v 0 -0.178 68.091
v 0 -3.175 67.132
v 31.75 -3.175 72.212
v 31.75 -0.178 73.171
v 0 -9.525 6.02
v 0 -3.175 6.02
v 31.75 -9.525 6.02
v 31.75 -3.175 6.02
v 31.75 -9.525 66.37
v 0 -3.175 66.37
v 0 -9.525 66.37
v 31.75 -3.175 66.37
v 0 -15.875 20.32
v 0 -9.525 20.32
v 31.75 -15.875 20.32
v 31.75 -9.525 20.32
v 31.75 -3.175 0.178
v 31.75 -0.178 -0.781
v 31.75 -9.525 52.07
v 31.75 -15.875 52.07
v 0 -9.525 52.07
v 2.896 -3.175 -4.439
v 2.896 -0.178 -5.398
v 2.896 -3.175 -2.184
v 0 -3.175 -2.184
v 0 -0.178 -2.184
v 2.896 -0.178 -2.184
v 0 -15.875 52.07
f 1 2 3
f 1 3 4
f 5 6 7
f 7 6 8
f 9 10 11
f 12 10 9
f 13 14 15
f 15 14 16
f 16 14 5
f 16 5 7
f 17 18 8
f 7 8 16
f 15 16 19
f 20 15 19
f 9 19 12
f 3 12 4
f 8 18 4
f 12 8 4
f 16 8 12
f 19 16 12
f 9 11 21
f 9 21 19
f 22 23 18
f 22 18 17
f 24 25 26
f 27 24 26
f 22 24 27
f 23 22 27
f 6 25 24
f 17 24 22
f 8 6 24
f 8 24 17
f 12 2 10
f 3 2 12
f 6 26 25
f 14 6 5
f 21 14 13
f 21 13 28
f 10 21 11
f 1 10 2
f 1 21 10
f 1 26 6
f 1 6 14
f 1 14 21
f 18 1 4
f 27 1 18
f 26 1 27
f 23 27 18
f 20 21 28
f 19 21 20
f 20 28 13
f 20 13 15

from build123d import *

# Parameters (mm, degrees)
F0_W      = 31.75
F0_H      = 67.31
F1_DEPTH  = 3.175
F3_DEPTH  = 25.4
F12_W     = 3.175
F12_H     = 0.1778
F14_DEPTH = 0.1778
F15_W     = 31.75
F15_H     = 15.875
F16_DEPTH = 12.7
F15_H_2   = 14.3002
F17_DEPTH = 6.35


with BuildPart() as f1:
    # F0 (on Front) → F1 (new body)
    with BuildSketch(Plane.XZ):
        with Locations((15.875, 33.655)):
            Rectangle(F0_W, F0_H)
        Polygon((31.75, 72.39), (0, 67.31), (31.75, 67.31), align=None)
        Polygon((31.75, 0), (0, 0), (0, -5.08), align=None)
    extrude(amount=F1_DEPTH)

    # F2 (on face) → F3 (cut)
    with BuildSketch(Plane.XZ.offset(3.175)):
        Polygon((0, -2.3622), (0, -2.54), (2.54, -2.54), (2.54, -4.6736), (2.7178, -4.645152), (2.7178, -2.3622), align=None)
        Polygon((2.54, -4.6736), (0, -5.08), (2.54, -5.08), align=None)
        Polygon((0, -2.54), (0, -5.08), (2.54, -4.6736), (2.54, -2.54), align=None)
    extrude(amount=-F3_DEPTH, mode=Mode.SUBTRACT)

    # F5: sweep along a path in F5_path
    with BuildLine(Plane(origin=(31.75, -3.175, 0), x_dir=(0.9874406319, 0, 0.1579905011), z_dir=(0.1579905011, 0, -0.9874406319))) as f5_path:
        Line((0, 0), (-29.4014638061, 0))
    # F4 (on face) → F5 (sweep)
    with BuildSketch(Plane(origin=(2.7178, 0, 0), x_dir=(0, -1, 0), z_dir=(-1, 0, 0))):
        Polygon((0, -5.661152), (3.175, -4.645152), (0, -4.645152), align=None)
    sweep(path=f5_path.line)

    # F7: sweep along a path in F7_path
    with BuildLine(Plane(origin=(31.75, -3.175, 72.39), x_dir=(0.9874406319, 0, 0.1579905011), z_dir=(0.1579905011, 0, -0.9874406319))) as f7_path:
        Line((0, 0), (-32.153831809, 0))
    # F6 (on face) → F7 (sweep)
    with BuildSketch(Plane(origin=(0, 0, 0), x_dir=(0, -1, 0), z_dir=(-1, 0, 0))):
        Polygon((0, 68.326), (0, 67.31), (3.175, 67.31), align=None)
    sweep(path=f7_path.line)

    # F9: sweep along a path in F9_path
    with BuildLine(Plane(origin=(0, -3.175, 67.31), x_dir=(-0.9874406319, 0, -0.1579905011), z_dir=(-0.1579905011, 0, 0.9874406319))) as f9_path:
        Line((0, 0), (-32.153831809, 0))
    # F8 (on face) → F9 (sweep, cut)
    with BuildSketch(Plane.YZ.offset(31.75)):
        Polygon((0, 73.406), (-3.175, 72.39), (-3.175, 72.2122), (0, 73.2282), align=None)
    sweep(path=f9_path.line, mode=Mode.SUBTRACT)

    # F11: sweep along a path in F11_path
    with BuildLine(Plane(origin=(31.75, -3.175, 0), x_dir=(0.9874406319, 0, 0.1579905011), z_dir=(0.1579905011, 0, -0.9874406319))) as f11_path:
        Line((0, 0), (-29.4014638061, 0))
    # F10 (on face) → F11 (sweep, cut)
    with BuildSketch(Plane.YZ.offset(31.75)):
        Polygon((-3.175, 0.1778), (-3.175, 0), (0, -1.016), (0, -0.8382), align=None)
    sweep(path=f11_path.line, mode=Mode.SUBTRACT)

    # F13: sweep along a path in F13_path
    with BuildLine(Plane(origin=(2.7178, 0, -2.3622), x_dir=(0, 0, -1), z_dir=(0, 1, 0))) as f13_path:
        Line((3.121152, 0), (0, 0))
        Line((0, 0), (0, 2.7178))
    # F12 (on face) → F13 (sweep, cut)
    with BuildSketch(Plane(origin=(0, 0, 0), x_dir=(0, -1, 0), z_dir=(-1, 0, 0))):
        with Locations((1.5875, -2.2733)):
            Rectangle(F12_W, F12_H)
    sweep(path=f13_path.line, transition=Transition.RIGHT, mode=Mode.SUBTRACT)

    # F14 (cut): a face of the model
    f14_faces = [f1.faces().sort_by_distance(p)[0] for p in [
        (15.9376220602, 0, 33.8178143866),
    ]]
    extrude(f14_faces, amount=-F14_DEPTH, mode=Mode.SUBTRACT)

    # F15 (on face) → F16 (join)
    with BuildSketch(Plane.XZ.offset(3.175)):
        with Locations((15.875, 44.1325)):
            Rectangle(F15_W, F15_H)
        with Locations((15.875, 28.2575)):
            Rectangle(F15_W, F15_H)
    extrude(amount=F16_DEPTH)

    # F15 (on face) → F17 (join)
    with BuildSketch(Plane.XZ.offset(3.175)):
        with Locations((15.875, 59.2201)):
            Rectangle(F15_W, F15_H_2)
        with Locations((15.875, 13.1699)):
            Rectangle(F15_W, F15_H_2)
    extrude(amount=F17_DEPTH)


solid = f1.part
